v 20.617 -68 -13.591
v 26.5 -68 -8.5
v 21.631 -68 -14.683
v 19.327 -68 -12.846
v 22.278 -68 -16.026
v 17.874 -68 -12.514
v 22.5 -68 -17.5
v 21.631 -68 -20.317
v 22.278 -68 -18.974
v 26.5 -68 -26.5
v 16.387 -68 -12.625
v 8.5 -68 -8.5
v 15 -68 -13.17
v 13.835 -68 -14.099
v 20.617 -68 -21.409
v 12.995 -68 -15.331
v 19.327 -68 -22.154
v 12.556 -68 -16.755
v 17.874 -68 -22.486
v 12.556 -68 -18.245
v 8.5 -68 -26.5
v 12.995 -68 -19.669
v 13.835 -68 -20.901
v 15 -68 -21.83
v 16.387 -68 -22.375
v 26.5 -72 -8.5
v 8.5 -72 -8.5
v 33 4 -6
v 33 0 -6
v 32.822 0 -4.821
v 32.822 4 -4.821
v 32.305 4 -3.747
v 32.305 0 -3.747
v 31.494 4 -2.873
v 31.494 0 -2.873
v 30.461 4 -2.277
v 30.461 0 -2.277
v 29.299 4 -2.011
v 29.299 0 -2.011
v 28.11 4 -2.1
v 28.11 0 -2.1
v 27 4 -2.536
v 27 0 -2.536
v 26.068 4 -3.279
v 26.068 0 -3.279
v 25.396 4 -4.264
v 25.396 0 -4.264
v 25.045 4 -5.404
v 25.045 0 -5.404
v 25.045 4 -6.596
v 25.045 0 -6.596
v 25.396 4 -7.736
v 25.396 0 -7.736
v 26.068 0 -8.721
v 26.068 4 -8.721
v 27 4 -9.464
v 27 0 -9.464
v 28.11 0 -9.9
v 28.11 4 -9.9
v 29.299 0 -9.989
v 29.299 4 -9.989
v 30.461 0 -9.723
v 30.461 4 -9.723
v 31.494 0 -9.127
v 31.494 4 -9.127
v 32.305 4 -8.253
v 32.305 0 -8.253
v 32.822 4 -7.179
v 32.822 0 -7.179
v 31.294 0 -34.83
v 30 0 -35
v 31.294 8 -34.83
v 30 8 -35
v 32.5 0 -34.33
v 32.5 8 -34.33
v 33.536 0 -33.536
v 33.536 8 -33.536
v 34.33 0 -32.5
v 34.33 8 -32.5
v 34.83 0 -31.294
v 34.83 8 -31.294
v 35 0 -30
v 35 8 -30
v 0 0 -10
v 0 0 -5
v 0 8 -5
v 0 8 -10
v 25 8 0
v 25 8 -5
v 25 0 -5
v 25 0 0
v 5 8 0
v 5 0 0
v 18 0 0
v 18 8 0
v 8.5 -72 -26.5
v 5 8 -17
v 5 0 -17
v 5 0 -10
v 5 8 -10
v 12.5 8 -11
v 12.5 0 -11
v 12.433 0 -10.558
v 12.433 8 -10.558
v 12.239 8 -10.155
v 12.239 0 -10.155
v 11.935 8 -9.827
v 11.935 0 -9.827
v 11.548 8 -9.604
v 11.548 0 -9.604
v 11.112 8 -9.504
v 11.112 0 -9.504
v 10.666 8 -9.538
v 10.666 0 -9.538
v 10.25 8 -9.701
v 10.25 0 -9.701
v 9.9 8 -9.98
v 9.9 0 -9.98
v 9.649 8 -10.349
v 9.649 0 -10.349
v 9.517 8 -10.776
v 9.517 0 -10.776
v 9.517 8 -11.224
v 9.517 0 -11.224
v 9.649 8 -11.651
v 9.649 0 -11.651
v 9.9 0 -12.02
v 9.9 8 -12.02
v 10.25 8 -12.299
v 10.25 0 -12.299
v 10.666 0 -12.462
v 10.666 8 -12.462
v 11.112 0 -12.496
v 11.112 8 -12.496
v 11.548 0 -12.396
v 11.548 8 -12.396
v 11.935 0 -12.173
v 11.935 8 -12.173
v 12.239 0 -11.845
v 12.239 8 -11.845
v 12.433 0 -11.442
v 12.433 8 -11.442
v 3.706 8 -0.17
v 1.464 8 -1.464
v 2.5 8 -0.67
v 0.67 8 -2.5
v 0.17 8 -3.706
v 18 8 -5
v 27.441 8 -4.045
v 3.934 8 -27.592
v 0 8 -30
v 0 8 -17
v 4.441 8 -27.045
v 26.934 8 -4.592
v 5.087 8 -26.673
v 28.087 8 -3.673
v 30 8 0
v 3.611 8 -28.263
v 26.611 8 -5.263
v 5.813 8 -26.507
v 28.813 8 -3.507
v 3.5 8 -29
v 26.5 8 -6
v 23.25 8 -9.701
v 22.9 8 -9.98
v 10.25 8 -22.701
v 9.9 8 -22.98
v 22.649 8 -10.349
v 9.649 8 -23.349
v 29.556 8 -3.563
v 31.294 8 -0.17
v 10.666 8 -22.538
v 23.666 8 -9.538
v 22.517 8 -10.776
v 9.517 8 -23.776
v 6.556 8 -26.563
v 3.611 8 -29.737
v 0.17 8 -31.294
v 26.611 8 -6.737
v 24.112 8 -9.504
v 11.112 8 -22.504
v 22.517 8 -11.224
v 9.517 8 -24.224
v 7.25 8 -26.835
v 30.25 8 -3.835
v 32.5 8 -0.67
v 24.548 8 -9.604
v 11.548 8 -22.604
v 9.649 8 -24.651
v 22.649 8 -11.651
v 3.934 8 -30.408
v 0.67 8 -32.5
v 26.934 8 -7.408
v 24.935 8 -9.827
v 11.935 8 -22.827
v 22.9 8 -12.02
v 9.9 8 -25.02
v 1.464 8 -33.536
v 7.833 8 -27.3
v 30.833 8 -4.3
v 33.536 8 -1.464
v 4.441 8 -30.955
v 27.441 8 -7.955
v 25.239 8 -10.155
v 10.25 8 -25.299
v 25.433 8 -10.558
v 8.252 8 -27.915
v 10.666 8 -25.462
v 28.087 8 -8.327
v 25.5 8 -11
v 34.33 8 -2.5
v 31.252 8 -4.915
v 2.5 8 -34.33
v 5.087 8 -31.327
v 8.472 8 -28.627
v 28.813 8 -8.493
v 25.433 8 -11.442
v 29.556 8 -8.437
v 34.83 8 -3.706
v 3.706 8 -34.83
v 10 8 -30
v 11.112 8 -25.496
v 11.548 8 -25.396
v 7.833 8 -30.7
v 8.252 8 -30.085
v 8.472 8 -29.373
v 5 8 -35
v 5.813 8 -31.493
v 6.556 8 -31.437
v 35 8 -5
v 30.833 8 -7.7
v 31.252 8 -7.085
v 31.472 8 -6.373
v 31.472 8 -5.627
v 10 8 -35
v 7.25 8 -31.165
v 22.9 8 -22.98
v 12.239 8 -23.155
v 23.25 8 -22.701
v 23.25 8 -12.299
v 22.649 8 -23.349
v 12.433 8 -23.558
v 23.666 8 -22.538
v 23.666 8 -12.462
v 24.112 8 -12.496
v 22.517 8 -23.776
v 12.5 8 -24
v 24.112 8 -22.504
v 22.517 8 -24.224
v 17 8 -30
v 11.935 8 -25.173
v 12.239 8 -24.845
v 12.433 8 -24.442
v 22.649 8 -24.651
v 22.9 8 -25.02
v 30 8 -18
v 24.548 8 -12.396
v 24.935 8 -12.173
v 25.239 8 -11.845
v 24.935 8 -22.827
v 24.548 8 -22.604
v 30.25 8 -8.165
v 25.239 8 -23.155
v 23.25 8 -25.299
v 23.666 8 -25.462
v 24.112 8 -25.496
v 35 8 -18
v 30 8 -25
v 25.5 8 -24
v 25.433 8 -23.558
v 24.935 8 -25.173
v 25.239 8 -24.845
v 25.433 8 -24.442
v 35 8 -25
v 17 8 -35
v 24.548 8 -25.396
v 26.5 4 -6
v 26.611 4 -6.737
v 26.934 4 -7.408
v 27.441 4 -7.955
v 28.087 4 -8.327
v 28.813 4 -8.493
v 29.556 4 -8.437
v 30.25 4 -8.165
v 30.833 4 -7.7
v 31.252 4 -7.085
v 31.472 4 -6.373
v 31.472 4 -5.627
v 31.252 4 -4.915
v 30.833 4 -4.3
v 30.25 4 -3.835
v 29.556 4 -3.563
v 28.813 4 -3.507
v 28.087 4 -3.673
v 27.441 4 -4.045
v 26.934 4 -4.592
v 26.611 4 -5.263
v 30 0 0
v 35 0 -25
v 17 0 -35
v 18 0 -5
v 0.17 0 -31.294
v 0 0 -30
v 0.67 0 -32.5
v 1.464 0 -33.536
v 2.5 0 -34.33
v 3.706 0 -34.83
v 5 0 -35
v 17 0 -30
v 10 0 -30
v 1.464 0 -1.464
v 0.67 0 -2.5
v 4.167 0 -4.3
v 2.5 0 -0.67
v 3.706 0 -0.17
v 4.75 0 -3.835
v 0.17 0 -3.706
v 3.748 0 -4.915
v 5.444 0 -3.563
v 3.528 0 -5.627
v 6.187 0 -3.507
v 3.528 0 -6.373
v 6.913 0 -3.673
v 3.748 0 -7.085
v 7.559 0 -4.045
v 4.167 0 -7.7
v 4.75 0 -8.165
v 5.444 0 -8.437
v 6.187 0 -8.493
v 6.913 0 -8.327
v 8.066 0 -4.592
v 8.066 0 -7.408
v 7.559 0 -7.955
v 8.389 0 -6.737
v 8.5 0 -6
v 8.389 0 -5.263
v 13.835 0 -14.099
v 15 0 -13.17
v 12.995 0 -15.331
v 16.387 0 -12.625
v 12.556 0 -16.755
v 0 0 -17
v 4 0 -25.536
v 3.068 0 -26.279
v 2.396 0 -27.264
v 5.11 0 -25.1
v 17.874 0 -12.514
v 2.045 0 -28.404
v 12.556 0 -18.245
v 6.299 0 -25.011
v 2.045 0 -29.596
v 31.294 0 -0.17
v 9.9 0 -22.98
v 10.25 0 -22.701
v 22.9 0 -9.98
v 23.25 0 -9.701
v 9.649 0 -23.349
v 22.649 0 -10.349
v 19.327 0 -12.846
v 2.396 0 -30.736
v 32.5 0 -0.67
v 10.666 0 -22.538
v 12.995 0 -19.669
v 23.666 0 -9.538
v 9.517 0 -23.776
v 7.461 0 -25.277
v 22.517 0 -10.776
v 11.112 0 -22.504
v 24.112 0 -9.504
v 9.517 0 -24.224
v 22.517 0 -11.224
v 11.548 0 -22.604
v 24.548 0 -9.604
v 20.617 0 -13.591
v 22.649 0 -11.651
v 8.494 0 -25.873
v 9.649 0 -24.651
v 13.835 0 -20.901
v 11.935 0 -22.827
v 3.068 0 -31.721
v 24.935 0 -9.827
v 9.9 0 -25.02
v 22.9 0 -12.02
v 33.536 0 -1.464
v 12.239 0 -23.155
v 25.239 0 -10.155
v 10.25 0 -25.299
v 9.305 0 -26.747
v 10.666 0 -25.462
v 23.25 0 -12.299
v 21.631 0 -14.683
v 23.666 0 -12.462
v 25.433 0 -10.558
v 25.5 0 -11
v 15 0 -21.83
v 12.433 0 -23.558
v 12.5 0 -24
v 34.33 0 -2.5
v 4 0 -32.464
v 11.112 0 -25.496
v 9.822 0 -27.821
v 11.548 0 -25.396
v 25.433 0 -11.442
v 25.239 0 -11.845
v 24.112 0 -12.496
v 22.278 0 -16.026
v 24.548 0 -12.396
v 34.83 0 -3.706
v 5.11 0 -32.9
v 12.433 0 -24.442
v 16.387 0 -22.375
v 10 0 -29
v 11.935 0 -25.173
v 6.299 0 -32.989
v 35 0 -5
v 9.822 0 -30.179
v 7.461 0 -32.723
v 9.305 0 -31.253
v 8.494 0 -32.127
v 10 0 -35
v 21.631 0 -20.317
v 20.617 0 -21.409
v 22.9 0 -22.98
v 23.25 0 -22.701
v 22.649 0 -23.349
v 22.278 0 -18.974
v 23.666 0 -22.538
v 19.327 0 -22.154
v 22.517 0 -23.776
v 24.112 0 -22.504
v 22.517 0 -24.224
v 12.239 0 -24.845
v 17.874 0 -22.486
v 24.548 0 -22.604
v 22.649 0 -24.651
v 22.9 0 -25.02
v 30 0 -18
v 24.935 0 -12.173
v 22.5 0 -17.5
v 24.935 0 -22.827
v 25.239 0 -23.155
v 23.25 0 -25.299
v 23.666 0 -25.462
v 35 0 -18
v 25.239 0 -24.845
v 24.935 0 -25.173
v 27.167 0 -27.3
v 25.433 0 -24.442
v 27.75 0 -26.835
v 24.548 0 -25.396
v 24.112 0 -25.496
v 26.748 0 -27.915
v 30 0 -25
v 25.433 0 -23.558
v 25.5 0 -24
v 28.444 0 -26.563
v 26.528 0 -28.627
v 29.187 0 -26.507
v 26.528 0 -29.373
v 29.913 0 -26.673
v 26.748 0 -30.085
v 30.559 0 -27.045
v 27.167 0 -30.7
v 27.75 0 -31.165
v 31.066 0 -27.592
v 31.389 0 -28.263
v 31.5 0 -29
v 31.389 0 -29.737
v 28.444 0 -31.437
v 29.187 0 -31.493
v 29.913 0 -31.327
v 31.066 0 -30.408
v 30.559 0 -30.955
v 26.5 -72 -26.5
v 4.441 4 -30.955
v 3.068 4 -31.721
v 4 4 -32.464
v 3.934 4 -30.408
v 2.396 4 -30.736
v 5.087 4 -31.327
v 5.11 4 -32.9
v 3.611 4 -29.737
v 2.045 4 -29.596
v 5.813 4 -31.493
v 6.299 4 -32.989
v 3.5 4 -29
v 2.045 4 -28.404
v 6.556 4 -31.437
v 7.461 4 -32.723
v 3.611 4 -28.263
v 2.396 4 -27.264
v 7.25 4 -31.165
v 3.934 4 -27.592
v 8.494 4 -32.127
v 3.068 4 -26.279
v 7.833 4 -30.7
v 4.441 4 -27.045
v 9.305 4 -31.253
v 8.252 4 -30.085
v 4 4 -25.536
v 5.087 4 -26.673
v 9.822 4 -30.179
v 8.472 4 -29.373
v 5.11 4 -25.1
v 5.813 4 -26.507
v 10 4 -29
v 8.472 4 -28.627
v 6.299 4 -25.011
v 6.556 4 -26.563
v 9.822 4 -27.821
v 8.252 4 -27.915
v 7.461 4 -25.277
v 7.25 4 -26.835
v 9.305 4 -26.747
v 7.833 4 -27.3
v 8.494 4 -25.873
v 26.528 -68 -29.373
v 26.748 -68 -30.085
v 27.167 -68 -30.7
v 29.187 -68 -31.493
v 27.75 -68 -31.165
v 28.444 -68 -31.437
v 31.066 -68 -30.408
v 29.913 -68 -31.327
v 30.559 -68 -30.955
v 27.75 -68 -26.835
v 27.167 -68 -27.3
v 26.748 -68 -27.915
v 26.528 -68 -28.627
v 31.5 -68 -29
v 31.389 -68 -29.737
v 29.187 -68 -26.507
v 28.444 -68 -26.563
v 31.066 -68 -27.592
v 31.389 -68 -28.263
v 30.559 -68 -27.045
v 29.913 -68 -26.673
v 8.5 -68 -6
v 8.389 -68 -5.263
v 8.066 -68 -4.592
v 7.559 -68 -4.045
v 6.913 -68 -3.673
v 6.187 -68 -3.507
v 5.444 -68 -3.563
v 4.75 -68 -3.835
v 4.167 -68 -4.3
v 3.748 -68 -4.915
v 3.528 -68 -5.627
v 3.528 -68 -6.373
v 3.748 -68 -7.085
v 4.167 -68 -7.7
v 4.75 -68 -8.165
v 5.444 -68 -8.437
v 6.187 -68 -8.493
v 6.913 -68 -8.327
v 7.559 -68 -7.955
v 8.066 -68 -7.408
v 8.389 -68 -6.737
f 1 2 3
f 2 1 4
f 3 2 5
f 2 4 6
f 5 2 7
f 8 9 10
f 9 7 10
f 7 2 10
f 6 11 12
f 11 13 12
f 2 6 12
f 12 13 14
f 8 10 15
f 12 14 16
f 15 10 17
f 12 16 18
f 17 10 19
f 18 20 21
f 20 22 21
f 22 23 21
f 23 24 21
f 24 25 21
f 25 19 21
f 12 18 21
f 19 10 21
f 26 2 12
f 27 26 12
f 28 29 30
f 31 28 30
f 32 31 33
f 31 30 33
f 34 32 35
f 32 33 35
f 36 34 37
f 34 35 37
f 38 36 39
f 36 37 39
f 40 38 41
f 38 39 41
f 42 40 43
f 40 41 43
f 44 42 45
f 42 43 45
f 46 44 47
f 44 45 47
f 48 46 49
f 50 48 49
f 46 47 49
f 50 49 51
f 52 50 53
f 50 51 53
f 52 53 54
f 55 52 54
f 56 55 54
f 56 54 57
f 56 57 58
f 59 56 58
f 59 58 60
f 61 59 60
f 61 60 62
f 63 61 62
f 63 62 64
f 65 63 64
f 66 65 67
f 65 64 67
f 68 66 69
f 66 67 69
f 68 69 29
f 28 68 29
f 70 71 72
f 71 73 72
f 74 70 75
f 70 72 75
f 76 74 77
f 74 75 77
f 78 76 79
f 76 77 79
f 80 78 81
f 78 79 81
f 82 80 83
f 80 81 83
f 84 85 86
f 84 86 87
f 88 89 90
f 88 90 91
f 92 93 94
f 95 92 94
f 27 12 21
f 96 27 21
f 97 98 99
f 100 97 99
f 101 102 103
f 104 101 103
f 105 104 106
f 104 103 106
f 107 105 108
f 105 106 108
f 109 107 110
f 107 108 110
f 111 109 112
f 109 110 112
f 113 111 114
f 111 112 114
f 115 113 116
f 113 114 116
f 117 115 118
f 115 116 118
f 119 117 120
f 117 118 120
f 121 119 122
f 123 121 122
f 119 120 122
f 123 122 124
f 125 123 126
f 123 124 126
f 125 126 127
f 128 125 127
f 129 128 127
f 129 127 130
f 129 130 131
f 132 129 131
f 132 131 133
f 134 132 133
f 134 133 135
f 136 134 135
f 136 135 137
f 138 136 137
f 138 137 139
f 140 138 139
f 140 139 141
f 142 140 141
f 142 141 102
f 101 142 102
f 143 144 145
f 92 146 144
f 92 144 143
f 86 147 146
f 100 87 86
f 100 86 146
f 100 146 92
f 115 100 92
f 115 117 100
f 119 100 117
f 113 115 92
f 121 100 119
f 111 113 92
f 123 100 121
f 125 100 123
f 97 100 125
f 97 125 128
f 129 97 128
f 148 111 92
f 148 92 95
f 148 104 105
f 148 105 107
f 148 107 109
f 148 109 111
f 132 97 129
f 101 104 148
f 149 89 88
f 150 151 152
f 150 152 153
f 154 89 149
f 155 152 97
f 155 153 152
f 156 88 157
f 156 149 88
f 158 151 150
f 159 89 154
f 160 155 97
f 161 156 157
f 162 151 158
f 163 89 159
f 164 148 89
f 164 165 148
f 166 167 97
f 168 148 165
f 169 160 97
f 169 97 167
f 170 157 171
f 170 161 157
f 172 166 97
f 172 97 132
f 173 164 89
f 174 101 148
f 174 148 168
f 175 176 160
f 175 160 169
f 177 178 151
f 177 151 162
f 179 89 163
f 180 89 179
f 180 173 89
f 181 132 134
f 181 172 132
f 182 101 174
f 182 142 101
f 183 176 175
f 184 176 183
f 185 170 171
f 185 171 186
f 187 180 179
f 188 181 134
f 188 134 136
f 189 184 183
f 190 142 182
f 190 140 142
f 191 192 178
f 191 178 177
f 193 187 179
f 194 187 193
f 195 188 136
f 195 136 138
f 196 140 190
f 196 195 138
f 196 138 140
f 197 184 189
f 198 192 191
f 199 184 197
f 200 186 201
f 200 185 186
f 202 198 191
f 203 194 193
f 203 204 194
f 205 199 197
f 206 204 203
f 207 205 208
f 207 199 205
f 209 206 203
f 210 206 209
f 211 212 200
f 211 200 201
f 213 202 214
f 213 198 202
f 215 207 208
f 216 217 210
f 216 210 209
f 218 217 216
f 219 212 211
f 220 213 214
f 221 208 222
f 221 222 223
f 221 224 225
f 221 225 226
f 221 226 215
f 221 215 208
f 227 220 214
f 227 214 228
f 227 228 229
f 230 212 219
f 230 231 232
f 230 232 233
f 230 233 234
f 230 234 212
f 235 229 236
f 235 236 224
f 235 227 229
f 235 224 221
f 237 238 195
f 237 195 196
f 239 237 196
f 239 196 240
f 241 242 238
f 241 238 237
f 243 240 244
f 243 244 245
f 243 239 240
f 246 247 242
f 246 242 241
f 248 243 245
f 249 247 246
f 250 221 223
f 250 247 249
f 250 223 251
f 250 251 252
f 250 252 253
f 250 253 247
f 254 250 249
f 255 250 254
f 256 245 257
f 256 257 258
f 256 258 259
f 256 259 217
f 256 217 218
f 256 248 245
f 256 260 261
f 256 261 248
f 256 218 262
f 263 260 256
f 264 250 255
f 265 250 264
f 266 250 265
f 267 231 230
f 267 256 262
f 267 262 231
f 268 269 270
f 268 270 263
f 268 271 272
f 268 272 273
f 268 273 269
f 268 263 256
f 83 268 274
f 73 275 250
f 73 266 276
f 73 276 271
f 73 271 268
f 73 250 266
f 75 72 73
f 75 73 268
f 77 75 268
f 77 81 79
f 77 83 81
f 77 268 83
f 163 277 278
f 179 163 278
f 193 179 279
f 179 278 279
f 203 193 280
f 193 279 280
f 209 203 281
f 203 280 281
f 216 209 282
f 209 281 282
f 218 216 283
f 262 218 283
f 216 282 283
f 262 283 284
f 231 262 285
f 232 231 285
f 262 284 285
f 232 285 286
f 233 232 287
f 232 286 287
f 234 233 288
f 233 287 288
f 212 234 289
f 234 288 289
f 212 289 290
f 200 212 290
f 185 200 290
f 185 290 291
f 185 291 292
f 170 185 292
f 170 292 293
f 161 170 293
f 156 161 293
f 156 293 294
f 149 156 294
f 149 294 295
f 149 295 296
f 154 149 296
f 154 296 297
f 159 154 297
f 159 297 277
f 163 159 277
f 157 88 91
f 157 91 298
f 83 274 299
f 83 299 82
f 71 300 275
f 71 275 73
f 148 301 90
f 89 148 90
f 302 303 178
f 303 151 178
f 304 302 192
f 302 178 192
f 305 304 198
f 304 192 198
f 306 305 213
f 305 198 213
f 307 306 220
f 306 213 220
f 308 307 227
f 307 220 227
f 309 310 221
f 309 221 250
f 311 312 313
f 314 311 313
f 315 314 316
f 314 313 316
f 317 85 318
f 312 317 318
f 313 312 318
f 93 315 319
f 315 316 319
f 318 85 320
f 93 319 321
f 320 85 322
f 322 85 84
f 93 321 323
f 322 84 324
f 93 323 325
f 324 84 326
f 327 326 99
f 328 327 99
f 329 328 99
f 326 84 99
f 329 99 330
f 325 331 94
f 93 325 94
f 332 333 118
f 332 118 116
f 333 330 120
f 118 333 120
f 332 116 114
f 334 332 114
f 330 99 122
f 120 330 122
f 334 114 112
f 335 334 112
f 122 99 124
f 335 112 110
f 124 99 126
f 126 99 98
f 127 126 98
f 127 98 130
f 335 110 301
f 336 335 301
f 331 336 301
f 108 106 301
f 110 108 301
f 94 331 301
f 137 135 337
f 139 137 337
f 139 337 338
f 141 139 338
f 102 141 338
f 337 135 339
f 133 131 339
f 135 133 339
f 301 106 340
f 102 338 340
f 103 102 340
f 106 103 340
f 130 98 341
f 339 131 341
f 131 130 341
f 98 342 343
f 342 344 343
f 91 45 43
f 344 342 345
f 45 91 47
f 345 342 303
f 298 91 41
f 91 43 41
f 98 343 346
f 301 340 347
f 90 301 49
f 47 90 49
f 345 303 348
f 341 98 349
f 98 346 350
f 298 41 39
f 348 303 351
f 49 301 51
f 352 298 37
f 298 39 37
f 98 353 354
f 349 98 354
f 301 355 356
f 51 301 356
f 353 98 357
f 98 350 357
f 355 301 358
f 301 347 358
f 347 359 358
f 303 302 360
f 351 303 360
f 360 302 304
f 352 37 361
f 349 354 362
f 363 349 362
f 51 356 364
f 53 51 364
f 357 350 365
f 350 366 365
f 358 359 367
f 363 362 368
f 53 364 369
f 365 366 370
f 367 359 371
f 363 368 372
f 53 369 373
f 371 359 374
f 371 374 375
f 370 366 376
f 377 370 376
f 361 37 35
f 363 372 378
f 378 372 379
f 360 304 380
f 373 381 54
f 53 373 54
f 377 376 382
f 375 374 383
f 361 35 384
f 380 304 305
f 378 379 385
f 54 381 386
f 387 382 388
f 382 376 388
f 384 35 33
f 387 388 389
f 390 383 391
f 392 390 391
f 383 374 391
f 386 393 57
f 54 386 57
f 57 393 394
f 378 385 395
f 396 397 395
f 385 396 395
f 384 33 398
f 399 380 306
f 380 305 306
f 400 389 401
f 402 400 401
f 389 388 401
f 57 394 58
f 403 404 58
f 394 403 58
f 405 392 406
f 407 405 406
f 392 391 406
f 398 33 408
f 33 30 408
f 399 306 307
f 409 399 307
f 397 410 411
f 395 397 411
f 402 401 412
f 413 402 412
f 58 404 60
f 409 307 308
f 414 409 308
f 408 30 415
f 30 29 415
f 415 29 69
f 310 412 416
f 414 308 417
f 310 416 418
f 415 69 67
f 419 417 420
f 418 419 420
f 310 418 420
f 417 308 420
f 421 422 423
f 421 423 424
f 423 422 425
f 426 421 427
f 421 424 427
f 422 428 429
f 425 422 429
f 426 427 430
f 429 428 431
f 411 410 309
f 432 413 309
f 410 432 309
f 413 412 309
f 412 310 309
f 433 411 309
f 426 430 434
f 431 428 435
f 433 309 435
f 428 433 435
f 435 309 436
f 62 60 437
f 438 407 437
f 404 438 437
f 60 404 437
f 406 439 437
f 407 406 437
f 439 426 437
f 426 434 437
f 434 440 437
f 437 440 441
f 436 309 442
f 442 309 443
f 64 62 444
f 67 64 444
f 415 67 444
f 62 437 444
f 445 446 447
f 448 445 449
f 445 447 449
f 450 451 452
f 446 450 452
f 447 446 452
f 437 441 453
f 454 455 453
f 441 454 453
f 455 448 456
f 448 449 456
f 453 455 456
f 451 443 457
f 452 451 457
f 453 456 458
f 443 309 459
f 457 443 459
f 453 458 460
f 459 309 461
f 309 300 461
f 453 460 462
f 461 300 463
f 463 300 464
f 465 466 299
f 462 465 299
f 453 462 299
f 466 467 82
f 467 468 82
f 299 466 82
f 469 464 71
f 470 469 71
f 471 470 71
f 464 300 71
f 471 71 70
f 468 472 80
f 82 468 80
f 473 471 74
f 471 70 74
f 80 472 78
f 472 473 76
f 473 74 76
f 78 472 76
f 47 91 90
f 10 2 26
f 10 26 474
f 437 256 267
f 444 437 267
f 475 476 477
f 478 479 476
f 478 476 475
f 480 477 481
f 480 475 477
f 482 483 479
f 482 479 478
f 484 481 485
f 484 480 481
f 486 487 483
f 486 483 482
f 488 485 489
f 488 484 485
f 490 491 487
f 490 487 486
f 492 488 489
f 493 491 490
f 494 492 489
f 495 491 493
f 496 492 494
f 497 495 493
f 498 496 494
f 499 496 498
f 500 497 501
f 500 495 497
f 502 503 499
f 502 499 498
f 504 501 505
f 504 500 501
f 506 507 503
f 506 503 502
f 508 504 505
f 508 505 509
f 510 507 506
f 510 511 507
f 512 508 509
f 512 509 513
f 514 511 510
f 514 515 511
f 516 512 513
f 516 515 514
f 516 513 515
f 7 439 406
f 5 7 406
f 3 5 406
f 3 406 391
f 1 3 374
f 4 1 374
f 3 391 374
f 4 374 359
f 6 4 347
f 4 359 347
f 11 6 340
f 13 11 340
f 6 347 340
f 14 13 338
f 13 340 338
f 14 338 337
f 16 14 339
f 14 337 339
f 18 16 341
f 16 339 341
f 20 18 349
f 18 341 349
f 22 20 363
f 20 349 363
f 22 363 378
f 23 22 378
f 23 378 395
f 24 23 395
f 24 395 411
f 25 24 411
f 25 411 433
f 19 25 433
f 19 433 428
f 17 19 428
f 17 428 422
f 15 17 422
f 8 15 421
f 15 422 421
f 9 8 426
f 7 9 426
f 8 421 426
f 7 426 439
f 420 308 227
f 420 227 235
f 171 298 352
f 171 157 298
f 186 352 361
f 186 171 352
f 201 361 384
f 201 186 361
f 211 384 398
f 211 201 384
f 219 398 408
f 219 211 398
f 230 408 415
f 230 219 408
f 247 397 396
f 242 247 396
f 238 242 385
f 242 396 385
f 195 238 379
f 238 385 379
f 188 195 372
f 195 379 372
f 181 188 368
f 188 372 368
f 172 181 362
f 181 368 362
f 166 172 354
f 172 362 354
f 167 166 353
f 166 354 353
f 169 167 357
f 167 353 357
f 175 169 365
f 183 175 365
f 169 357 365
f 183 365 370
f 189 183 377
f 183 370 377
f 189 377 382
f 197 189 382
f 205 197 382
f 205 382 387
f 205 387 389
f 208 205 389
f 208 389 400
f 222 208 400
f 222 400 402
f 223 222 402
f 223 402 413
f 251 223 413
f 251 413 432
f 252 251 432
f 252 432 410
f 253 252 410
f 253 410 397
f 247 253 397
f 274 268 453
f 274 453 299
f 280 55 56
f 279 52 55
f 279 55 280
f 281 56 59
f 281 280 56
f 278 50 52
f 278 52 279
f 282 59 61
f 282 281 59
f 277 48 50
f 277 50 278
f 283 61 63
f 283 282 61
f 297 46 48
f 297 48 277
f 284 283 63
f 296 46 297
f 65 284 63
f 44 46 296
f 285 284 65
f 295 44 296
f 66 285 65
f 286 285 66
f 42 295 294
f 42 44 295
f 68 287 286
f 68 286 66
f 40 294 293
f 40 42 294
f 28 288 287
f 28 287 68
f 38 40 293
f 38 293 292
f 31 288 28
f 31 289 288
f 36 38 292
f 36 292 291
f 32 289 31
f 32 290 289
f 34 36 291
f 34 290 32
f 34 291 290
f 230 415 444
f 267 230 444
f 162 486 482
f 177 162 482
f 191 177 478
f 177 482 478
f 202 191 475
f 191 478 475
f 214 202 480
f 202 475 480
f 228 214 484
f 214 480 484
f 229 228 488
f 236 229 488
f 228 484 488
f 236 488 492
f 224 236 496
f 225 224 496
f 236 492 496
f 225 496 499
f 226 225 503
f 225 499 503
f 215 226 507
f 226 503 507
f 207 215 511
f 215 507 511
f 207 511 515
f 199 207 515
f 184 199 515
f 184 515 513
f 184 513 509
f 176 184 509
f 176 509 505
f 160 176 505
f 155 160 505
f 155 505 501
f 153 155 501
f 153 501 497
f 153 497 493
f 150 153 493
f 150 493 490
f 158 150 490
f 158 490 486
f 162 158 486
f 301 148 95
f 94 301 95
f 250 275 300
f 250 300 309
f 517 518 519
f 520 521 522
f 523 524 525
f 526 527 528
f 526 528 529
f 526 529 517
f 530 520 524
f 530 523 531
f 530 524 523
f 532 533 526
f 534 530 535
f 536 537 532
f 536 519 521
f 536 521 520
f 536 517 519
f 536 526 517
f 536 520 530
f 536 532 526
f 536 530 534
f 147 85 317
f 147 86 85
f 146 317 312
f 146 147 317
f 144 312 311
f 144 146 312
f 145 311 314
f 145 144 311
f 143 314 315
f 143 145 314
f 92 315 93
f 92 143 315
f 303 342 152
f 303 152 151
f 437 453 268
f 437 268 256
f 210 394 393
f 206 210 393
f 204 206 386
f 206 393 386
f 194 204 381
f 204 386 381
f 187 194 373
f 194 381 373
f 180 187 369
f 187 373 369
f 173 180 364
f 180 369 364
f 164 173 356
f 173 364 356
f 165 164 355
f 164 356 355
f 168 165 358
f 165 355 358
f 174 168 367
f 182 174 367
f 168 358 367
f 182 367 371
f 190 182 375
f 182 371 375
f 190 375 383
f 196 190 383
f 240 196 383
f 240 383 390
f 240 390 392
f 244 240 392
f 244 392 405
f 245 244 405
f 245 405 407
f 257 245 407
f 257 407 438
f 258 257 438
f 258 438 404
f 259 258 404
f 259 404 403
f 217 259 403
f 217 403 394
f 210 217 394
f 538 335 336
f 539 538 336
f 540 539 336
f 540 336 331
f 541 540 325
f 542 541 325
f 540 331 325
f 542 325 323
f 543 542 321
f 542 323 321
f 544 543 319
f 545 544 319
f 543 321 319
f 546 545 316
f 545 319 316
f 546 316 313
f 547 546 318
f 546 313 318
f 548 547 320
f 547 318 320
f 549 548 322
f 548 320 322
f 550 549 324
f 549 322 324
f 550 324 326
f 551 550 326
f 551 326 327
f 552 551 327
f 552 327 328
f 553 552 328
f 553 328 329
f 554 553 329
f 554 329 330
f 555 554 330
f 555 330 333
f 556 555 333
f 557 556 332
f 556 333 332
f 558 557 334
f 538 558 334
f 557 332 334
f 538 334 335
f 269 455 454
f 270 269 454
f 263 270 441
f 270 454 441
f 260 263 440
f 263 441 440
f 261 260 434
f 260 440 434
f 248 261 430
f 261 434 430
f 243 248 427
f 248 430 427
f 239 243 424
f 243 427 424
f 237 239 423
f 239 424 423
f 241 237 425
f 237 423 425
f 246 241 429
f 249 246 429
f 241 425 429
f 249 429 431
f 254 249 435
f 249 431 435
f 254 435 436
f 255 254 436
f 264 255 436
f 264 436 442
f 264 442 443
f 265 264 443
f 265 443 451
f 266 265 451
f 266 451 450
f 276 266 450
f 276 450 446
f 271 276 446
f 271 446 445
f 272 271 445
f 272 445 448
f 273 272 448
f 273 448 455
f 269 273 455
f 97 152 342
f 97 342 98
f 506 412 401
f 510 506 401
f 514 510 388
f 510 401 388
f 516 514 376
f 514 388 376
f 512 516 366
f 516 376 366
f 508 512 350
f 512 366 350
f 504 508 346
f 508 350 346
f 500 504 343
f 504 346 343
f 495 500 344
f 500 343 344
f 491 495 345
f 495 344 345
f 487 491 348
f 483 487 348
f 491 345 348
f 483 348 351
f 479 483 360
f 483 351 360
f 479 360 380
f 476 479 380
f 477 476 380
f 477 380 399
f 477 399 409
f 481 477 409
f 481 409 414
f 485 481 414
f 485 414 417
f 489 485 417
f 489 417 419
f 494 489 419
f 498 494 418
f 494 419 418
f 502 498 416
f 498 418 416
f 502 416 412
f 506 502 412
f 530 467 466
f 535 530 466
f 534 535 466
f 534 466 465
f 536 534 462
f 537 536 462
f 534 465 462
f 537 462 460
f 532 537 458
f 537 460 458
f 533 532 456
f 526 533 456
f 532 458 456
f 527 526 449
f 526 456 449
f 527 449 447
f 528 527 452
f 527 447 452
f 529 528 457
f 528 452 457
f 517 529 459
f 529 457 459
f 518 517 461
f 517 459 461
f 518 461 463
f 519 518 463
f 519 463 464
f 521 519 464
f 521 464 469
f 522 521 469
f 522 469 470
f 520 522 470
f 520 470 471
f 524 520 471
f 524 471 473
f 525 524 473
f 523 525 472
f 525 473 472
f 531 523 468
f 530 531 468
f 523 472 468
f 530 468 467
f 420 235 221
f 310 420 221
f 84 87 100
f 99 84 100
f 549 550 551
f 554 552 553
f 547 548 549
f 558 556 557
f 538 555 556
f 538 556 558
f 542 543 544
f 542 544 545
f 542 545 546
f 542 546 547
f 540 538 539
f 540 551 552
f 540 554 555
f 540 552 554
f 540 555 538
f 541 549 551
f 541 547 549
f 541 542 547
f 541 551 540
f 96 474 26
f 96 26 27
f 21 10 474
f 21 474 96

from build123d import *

# Parameters (mm, degrees)
SKETCH1_W           = 35
SKETCH1_H           = 35
BOSS_EXTRUDE1_DEPTH = 8
SKETCH2_W           = 7
SKETCH2_H           = 5
SKETCH2_W_2         = 5
SKETCH2_H_2         = 7
SKETCH2_R           = 1.5
CUT_EXTRUDE1_DEPTH  = 51.139804547
SKETCH2_5_R         = 4
SKETCH2_5_R_2       = 1.5
CUT_EXTRUDE2_DEPTH  = 4
SKETCH2_7_R         = 2.5
SKETCH2_7_R_2       = 5
BOSS_EXTRUDE2_DEPTH = 68
SKETCH3_W           = 18
SKETCH3_H           = 18
BOSS_EXTRUDE3_DEPTH = 4
FILLET1_R           = 5
SKETCH4_R           = 2.5
CUT_EXTRUDE3_DEPTH  = 10


with BuildPart() as part:
    # Sketch1 → Boss-Extrude1 (new body)
    with BuildSketch(Plane(origin=(0, 0, 0), x_dir=(1, 0, 0), z_dir=(0, 1, 0))):
        with Locations((17.5, 17.5)):
            Rectangle(SKETCH1_W, SKETCH1_H)
    extrude(amount=BOSS_EXTRUDE1_DEPTH)

    # Sketch2 → Cut-Extrude1 (cut, through all)
    with BuildSketch(Plane.XZ):
        with Locations((21.5, -2.5)):
            Rectangle(SKETCH2_W, SKETCH2_H)
        with Locations((2.5, -13.5)):
            Rectangle(SKETCH2_W_2, SKETCH2_H_2)
        with Locations((32.5, -21.5)):
            Rectangle(SKETCH2_W_2, SKETCH2_H_2)
        with Locations((13.5, -32.5)):
            Rectangle(SKETCH2_W, SKETCH2_H)
        with Locations((11, -11)):
            Circle(SKETCH2_R)
        with Locations((24, -11)):
            Circle(SKETCH2_R)
        with Locations((24, -24)):
            Circle(SKETCH2_R)
        with Locations((11, -24)):
            Circle(SKETCH2_R)
    extrude(amount=-CUT_EXTRUDE1_DEPTH, mode=Mode.SUBTRACT)

    # Sketch2<5> → Cut-Extrude2 (cut)
    with BuildSketch(Plane.XZ):
        with Locations((29, -6)):
            Circle(SKETCH2_5_R)
        with Locations((6, -29)):
            Circle(SKETCH2_5_R)
        with Locations((11, -11)):
            Circle(SKETCH2_5_R_2)
    extrude(amount=-CUT_EXTRUDE2_DEPTH, mode=Mode.SUBTRACT)

    # Sketch2<7> → Boss-Extrude2 (add)
    with BuildSketch(Plane.XZ):
        with Locations((6, -6)):
            Circle(SKETCH2_7_R)
        with Locations((29, -29)):
            Circle(SKETCH2_7_R)
        with Locations((17.5, -17.5)):
            Circle(SKETCH2_7_R_2)
    extrude(amount=BOSS_EXTRUDE2_DEPTH)

    # Sketch3 → Boss-Extrude3 (add)
    with BuildSketch(Plane(origin=(0, -68, 0), x_dir=(-1, 0, 0), z_dir=(0, -1, 0))):
        with Locations((-17.5, 17.5)):
            Rectangle(SKETCH3_W, SKETCH3_H)
    extrude(amount=BOSS_EXTRUDE3_DEPTH)

    # Fillet1
    fillet1_edges = [part.edges().sort_by_distance(p)[0] for p in [
        (35, 4, -35),
        (0, 4, -35),
        (0, 4, 0),
        (35, 4, 0),
    ]]
    fillet(fillet1_edges, radius=FILLET1_R)

    # Sketch4 → Cut-Extrude3 (cut)
    with BuildSketch(Plane(origin=(0, 4, 0), x_dir=(-1, 0, 0), z_dir=(0, -1, 0))):
        with Locations((-29, 6)):
            Circle(SKETCH4_R)
        with Locations((-6, 29)):
            Circle(SKETCH4_R)
    extrude(amount=-CUT_EXTRUDE3_DEPTH, mode=Mode.SUBTRACT)


solid = part.part
